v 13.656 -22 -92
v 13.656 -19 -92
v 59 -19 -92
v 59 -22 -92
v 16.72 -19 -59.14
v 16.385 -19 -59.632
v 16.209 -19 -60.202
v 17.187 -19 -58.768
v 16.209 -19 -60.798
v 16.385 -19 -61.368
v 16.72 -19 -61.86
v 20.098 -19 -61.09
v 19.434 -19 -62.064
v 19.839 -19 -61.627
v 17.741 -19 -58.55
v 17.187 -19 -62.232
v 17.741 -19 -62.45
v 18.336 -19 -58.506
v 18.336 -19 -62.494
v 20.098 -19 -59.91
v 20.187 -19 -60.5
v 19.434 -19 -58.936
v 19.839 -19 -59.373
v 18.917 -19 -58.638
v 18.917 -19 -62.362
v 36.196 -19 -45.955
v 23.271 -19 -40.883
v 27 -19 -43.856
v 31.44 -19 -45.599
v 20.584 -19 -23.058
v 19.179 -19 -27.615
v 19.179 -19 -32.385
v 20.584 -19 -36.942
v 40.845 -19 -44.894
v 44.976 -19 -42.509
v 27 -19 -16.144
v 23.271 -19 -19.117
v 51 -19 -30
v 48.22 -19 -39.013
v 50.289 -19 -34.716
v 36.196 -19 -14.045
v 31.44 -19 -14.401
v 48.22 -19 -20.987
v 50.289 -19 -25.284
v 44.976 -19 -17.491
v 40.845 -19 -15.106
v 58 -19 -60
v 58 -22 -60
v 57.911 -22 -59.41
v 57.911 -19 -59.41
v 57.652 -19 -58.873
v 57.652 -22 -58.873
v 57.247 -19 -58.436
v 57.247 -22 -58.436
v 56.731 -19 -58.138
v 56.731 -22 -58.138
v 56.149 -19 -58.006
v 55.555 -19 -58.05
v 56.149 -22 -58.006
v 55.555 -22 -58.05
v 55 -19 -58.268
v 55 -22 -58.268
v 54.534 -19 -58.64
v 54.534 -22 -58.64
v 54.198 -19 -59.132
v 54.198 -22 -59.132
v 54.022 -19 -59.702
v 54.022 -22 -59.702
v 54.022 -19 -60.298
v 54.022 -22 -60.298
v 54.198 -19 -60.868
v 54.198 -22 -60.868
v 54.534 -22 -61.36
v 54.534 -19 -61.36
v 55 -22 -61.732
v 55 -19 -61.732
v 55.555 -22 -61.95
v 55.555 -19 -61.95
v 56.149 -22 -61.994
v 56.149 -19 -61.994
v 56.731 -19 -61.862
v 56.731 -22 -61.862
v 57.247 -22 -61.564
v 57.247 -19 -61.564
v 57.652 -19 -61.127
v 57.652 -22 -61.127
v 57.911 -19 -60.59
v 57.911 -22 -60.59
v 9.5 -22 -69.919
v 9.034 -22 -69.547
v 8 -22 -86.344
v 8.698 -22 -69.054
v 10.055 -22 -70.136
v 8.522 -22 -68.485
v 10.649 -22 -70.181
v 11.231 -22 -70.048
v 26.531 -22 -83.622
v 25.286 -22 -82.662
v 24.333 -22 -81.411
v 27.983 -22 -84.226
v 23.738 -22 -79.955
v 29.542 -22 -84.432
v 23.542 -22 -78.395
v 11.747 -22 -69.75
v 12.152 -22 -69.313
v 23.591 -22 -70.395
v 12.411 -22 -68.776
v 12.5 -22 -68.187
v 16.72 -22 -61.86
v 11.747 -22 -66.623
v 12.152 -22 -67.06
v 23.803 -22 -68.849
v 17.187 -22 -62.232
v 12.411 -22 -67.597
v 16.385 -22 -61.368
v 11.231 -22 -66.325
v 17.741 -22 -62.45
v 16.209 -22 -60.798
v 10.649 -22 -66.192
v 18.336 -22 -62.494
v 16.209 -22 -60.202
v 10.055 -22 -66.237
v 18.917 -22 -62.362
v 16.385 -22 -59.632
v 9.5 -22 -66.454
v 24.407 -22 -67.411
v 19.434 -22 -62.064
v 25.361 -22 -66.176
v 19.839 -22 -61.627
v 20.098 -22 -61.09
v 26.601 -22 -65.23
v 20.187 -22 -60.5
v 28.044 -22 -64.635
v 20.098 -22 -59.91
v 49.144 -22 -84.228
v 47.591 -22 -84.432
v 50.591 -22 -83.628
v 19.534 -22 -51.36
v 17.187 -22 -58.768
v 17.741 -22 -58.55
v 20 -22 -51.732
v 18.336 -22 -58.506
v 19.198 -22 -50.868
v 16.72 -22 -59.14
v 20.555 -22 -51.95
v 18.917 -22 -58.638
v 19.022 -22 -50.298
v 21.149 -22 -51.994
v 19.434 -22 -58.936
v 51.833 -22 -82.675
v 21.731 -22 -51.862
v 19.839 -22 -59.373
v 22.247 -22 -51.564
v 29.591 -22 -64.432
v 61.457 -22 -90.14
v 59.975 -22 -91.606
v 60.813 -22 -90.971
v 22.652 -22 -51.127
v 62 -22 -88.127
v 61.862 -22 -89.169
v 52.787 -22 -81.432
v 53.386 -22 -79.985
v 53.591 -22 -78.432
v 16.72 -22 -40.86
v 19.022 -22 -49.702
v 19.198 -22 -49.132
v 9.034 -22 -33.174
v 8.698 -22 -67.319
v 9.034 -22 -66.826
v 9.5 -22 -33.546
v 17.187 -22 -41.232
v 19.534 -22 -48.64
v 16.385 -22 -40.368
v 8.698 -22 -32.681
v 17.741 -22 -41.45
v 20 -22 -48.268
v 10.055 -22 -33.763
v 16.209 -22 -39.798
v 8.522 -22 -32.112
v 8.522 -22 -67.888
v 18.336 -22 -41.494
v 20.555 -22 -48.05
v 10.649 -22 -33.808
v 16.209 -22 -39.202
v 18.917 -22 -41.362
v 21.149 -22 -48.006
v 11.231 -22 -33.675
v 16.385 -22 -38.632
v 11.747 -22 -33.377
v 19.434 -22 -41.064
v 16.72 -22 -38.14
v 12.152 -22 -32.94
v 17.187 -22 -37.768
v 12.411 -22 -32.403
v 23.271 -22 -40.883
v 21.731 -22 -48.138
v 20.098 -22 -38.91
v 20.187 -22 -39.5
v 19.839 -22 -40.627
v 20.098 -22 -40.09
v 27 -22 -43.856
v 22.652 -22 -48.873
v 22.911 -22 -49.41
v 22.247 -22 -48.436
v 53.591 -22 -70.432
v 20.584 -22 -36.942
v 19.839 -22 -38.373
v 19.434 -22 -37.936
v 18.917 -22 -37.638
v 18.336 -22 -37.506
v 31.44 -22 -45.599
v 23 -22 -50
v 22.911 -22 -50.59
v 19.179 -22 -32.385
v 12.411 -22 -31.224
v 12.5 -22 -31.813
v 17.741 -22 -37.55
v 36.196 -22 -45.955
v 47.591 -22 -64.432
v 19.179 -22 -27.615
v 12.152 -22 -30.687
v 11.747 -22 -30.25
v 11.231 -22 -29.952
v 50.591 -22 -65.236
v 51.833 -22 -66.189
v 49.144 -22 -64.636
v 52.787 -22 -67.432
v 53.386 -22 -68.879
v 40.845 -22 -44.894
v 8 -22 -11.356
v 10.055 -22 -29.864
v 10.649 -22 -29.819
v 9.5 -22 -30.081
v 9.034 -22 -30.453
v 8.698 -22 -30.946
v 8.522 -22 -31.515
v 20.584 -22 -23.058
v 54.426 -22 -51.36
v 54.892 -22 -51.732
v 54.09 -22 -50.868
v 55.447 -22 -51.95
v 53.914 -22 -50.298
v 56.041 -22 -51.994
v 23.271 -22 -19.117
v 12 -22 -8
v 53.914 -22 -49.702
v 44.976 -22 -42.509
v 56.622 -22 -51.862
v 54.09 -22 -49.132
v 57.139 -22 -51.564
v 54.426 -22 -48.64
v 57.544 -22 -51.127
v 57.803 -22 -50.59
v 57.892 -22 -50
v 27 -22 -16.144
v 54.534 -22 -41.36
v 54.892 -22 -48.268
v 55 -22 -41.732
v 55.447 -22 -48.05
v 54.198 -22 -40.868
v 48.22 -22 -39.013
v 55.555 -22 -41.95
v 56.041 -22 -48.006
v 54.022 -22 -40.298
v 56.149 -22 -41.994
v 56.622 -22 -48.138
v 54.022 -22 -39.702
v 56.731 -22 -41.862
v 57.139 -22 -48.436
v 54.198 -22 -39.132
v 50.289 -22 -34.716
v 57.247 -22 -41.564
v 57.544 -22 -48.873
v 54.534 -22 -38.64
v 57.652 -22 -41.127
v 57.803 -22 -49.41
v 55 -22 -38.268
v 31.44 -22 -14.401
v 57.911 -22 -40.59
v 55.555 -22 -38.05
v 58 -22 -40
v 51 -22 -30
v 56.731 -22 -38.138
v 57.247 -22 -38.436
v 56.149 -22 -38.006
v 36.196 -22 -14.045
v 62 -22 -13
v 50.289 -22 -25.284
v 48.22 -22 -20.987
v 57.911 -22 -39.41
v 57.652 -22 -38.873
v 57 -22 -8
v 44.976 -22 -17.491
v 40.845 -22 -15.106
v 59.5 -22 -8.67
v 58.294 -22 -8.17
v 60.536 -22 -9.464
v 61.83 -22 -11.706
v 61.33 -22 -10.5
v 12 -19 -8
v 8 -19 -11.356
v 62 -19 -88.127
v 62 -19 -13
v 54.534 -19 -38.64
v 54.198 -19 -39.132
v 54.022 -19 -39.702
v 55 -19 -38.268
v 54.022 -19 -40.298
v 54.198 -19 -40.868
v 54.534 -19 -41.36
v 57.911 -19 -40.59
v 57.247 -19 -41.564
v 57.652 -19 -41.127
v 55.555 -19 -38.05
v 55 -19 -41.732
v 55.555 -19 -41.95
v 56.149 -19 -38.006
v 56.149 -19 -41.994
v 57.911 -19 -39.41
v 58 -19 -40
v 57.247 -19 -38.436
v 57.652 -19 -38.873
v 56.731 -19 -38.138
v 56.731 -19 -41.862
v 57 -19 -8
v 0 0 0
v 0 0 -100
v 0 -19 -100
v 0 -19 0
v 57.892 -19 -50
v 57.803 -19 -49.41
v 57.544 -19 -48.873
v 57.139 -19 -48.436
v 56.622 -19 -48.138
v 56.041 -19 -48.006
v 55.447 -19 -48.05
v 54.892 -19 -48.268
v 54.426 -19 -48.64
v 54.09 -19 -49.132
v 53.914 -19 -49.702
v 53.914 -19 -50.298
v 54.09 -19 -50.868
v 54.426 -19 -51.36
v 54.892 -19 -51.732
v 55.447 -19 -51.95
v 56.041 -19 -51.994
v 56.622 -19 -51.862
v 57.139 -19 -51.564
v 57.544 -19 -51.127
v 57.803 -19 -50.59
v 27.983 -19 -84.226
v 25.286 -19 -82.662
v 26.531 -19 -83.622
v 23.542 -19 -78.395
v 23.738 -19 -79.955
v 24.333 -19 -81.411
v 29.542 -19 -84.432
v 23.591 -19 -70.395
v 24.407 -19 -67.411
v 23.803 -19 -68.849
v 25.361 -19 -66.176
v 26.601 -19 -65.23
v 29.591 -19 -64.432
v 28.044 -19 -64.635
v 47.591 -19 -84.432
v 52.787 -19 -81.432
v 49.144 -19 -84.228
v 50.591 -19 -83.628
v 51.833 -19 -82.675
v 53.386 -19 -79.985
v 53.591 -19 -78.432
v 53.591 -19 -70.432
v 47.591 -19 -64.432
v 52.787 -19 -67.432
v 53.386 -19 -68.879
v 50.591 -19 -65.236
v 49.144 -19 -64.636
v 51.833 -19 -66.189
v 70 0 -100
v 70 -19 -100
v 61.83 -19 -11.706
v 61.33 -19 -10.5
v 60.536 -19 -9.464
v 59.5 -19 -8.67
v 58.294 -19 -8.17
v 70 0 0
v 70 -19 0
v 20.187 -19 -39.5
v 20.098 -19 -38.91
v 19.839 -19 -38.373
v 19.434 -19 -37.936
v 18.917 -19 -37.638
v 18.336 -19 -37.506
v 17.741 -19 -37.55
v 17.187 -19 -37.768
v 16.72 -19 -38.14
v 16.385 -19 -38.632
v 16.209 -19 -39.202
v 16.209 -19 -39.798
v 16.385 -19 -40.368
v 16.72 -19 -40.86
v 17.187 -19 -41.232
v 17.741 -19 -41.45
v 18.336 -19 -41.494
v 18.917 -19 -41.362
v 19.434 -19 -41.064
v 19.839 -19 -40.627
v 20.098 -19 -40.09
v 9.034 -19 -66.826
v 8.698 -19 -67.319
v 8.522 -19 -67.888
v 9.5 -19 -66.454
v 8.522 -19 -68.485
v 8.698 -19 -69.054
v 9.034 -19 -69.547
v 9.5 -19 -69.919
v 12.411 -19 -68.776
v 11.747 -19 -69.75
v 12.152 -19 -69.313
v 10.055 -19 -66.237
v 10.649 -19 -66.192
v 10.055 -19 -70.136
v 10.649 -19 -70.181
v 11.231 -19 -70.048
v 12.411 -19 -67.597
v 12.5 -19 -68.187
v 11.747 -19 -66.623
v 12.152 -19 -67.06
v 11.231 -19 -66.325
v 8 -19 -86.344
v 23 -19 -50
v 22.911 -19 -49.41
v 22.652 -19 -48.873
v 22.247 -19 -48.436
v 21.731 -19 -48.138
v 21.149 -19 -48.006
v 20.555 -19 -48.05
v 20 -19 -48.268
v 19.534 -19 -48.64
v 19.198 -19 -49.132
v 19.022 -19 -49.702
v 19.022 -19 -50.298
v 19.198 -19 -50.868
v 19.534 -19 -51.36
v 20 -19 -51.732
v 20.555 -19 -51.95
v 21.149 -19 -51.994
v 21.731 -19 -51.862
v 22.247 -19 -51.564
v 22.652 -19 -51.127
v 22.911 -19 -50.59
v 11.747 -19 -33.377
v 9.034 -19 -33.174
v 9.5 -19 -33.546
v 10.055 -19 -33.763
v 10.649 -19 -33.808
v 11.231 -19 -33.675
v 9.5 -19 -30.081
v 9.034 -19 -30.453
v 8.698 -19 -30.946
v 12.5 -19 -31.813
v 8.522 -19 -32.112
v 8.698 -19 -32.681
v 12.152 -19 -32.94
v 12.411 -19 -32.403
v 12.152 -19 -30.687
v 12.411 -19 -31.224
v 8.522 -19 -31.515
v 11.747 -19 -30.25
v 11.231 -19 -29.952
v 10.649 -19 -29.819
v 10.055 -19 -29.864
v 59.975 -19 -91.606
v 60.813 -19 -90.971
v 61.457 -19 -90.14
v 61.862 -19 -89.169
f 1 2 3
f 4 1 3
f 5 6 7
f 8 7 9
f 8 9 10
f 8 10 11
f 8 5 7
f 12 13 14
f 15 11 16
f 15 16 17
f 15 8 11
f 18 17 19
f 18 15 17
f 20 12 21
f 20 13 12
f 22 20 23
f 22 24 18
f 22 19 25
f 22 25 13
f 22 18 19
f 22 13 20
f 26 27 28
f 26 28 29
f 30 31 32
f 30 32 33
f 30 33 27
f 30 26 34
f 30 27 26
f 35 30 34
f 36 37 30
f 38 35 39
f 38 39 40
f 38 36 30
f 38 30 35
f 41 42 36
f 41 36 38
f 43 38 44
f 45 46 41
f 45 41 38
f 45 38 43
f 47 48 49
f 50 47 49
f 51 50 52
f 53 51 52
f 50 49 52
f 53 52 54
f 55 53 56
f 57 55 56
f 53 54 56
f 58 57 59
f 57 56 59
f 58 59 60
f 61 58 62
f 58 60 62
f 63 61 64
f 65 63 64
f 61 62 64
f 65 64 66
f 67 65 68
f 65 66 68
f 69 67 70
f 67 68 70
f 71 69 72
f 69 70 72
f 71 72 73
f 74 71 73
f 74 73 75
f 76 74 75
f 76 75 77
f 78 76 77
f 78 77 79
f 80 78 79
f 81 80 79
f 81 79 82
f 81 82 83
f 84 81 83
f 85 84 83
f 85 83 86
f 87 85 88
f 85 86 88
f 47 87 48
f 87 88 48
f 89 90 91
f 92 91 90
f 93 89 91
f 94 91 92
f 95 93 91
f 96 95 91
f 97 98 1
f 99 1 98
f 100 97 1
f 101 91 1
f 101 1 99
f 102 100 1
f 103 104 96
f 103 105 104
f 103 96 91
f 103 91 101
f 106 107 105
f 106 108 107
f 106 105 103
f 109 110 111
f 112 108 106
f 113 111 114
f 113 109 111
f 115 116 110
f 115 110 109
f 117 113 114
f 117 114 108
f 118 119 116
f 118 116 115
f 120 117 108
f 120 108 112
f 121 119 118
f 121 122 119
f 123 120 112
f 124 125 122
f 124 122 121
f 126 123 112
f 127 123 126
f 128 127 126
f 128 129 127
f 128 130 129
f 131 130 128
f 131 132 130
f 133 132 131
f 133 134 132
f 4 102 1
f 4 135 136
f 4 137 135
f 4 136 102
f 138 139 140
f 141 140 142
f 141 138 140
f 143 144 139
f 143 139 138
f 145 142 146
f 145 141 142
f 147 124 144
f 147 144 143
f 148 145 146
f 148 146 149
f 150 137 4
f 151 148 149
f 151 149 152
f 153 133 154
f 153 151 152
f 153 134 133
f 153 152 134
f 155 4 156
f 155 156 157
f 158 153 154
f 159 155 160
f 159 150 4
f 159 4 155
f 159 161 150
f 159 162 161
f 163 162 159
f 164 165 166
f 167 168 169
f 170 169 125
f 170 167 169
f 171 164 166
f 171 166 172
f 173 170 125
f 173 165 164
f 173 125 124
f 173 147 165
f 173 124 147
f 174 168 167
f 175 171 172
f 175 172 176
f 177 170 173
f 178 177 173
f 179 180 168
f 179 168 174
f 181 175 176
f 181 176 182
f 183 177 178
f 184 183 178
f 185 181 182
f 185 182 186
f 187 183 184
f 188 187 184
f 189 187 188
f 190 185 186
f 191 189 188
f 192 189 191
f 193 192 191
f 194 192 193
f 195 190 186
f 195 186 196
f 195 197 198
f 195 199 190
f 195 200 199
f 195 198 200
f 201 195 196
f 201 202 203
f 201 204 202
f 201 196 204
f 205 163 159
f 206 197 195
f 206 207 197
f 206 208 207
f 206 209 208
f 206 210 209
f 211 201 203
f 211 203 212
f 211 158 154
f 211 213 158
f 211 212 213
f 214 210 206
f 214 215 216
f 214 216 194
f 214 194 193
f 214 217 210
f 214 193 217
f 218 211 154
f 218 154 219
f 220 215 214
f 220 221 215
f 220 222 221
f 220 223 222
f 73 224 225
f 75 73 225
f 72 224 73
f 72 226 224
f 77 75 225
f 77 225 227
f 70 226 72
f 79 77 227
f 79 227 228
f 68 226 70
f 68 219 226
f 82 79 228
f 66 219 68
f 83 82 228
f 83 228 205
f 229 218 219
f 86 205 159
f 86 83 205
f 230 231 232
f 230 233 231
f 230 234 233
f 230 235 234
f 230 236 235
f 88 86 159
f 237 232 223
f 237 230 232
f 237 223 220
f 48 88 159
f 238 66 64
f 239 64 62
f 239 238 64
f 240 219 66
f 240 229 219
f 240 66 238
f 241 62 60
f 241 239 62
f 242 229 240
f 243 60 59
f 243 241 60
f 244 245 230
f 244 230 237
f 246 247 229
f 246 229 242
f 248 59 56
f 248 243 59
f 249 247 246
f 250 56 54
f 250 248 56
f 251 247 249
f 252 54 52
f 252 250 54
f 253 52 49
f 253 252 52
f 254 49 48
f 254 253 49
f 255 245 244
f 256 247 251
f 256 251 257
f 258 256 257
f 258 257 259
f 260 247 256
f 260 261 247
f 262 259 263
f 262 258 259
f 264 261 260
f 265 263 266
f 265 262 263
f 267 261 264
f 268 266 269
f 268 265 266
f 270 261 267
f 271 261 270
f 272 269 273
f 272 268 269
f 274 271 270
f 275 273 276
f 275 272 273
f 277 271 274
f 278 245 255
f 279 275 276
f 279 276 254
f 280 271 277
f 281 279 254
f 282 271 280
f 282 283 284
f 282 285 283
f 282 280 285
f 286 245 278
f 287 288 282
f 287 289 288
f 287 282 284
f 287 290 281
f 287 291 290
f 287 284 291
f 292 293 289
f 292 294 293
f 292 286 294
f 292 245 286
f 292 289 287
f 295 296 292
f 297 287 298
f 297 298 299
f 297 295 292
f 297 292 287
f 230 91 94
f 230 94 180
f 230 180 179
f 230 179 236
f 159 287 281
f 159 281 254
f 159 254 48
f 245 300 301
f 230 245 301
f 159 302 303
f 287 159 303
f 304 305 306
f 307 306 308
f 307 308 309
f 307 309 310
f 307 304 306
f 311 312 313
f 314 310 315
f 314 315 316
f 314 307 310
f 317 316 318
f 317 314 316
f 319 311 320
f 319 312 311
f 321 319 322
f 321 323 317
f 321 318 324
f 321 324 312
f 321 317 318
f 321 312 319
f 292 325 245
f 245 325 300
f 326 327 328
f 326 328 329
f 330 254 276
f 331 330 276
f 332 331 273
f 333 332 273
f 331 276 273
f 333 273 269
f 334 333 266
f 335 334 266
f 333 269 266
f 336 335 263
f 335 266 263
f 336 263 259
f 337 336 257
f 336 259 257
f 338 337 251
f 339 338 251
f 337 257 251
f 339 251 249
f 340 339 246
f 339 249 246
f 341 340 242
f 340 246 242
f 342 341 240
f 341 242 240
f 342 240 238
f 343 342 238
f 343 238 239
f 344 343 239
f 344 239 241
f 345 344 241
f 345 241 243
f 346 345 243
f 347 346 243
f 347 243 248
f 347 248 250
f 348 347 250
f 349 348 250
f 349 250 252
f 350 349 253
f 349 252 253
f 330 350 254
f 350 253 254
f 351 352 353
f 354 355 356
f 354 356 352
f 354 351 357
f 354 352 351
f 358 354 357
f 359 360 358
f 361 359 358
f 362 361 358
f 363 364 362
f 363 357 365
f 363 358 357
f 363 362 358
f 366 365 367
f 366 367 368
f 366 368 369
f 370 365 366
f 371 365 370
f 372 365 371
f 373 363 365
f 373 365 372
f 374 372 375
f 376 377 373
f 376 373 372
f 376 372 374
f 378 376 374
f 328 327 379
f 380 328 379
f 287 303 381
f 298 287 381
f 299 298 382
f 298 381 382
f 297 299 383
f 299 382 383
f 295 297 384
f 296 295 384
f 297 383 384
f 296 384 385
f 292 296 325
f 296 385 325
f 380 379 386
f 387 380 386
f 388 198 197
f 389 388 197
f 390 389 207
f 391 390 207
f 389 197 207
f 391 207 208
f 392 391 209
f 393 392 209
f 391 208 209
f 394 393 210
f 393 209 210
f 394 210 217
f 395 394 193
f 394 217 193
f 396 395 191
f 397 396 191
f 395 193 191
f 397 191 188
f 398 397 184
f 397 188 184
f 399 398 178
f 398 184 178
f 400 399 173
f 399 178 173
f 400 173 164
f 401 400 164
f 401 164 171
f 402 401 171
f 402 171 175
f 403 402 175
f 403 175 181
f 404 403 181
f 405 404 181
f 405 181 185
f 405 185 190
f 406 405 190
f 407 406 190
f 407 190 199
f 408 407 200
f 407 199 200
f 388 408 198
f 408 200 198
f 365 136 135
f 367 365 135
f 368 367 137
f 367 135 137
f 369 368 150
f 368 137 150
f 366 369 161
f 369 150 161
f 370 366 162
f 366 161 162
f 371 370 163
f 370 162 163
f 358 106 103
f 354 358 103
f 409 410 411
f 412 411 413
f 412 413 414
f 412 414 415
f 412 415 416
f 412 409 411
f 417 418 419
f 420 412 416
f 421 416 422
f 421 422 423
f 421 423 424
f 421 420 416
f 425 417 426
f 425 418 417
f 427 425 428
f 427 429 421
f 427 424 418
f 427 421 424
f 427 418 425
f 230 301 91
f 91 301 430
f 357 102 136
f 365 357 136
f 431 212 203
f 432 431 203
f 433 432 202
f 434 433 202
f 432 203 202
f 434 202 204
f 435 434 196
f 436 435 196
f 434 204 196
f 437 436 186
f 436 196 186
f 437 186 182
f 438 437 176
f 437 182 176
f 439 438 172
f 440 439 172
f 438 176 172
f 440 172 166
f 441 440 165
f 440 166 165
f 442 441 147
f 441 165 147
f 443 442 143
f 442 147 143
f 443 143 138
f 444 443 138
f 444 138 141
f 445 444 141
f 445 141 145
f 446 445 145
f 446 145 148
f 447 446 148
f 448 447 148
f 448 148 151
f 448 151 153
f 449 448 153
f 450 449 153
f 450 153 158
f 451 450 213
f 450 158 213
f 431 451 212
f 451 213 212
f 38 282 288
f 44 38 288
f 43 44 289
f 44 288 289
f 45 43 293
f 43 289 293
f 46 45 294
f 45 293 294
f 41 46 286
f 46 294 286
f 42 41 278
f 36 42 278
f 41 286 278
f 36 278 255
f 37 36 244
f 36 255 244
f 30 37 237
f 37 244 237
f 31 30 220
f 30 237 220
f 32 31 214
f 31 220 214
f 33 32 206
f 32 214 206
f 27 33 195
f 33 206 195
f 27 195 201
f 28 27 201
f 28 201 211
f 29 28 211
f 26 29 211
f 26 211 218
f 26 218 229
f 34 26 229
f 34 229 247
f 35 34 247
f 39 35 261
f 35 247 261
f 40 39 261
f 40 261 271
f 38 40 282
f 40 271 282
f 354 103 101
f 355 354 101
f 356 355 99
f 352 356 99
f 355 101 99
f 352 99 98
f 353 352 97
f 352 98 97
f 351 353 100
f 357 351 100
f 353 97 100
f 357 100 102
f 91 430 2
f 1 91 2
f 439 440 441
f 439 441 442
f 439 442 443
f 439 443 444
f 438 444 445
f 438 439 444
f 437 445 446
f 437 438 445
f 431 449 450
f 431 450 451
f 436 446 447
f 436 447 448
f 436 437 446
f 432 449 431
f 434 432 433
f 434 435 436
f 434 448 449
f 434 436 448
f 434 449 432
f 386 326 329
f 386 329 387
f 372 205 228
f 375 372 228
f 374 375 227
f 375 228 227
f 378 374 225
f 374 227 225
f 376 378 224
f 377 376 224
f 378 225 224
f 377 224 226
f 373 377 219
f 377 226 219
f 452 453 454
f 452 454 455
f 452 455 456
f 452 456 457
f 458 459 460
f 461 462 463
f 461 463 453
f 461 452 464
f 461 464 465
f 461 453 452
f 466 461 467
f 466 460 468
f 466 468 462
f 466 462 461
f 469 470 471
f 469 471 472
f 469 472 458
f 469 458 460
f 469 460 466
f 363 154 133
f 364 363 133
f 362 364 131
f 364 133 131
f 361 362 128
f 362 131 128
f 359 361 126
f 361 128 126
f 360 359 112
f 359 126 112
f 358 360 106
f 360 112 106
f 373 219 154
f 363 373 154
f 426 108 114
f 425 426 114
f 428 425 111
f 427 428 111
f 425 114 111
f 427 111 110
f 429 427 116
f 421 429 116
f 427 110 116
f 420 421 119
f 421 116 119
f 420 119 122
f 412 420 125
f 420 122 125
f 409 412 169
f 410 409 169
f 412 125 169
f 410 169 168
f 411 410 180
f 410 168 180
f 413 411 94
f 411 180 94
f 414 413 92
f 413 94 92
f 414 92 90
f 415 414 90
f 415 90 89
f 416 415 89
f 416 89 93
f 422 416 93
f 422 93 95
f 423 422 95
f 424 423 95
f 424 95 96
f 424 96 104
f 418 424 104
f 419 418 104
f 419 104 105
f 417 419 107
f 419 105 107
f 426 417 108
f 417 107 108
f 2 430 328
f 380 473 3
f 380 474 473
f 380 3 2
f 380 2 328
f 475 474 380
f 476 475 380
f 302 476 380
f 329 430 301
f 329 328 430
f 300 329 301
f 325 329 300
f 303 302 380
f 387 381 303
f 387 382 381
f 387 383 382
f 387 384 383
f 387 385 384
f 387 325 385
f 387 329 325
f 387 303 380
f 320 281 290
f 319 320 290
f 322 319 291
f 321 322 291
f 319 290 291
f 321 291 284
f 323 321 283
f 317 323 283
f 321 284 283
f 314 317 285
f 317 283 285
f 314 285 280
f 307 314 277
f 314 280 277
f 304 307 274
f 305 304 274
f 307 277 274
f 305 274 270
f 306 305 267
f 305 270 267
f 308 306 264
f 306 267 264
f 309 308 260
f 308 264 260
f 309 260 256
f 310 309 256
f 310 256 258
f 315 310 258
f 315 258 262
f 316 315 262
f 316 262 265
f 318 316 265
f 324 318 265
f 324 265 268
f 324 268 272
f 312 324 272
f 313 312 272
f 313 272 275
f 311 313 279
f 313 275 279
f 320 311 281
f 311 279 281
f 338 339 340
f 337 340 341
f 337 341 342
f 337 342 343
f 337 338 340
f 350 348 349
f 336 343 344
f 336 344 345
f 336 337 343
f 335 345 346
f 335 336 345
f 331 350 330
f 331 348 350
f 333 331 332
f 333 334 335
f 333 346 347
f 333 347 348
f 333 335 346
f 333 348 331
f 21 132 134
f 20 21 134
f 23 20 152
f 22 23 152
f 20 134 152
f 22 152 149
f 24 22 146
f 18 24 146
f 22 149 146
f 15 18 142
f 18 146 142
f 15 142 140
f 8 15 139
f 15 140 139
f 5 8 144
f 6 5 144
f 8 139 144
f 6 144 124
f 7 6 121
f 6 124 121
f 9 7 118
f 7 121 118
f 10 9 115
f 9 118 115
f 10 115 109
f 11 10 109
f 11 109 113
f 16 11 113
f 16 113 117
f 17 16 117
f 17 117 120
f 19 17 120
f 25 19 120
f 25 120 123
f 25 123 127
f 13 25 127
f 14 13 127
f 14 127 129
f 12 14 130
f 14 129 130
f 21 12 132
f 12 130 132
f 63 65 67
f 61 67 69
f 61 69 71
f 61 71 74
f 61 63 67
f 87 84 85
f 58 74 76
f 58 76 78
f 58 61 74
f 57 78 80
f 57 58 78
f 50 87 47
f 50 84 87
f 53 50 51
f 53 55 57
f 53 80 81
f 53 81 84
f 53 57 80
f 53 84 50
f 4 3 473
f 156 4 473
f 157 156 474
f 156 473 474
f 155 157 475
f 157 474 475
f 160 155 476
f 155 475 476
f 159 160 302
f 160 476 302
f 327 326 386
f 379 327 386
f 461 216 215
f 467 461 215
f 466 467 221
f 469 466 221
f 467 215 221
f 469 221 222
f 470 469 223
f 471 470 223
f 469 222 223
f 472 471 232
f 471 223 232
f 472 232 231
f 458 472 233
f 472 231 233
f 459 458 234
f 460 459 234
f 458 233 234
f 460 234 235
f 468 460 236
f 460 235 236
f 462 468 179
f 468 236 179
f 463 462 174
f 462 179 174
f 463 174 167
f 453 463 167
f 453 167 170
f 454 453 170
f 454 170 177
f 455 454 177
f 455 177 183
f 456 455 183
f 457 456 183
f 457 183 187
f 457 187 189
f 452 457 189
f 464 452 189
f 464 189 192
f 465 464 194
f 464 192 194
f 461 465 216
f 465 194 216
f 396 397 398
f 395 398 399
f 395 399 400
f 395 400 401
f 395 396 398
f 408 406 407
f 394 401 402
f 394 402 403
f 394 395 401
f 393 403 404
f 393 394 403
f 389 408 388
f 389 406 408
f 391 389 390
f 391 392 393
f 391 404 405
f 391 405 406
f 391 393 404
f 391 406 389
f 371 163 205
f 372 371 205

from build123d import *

# Parameters (mm, degrees)
F0_W      = 70
F0_H      = 100
F1_DEPTH  = 19
F3_DEPTH  = 3
F4_R      = 16
F5_DEPTH  = 3
F7_DEPTH  = 3
F8_R      = 2
F9_DEPTH  = 3
F10_R     = 2
F11_DEPTH = 3


with BuildPart() as f1:
    # F0 (on Front) → F1 (new body)
    with BuildSketch(Plane.XZ):
        with Locations((35, -50)):
            Rectangle(F0_W, F0_H)
    extrude(amount=F1_DEPTH)

    # F2 (on face) → F3 (join)
    with BuildSketch(Plane.XZ.offset(19)):
        with BuildLine():
            Line((57, -8), (12, -8))
            Line((12, -8), (8, -11.356399))
            Line((8, -11.356399), (8, -86.344417))
            Line((8, -86.344417), (13.655583, -92))
            Line((13.655583, -92), (59, -92))
            ThreePointArc((59, -92), (61.162278, -90.576506), (62, -88.127017))
            Line((62, -88.127017), (62, -13))
            ThreePointArc((62, -13), (60.535534, -9.464466), (57, -8))
        make_face()
    extrude(amount=F3_DEPTH)

    # F4 (on face) → F5 (cut)
    with BuildSketch(Plane.XZ.offset(22)):
        with Locations((35, -30)):
            Circle(F4_R)
    extrude(amount=-F5_DEPTH, mode=Mode.SUBTRACT)

    # F6 (on face) → F7 (cut)
    with BuildSketch(Plane.XZ.offset(22)):
        with BuildLine():
            Line((47.590841, -64.431946), (29.590728, -64.431946))
            ThreePointArc((29.590728, -64.431946), (25.361132, -66.176302), (23.590841, -70.395109))
            Line((23.590841, -70.395109), (23.541725, -78.395109))
            ThreePointArc((23.541725, -78.395109), (25.285967, -82.661543), (29.541612, -84.431946))
            Line((29.541612, -84.431946), (47.590841, -84.431946))
            ThreePointArc((47.590841, -84.431946), (51.833482, -82.674587), (53.590841, -78.431946))
            Line((53.590841, -78.431946), (53.590841, -70.431946))
            ThreePointArc((53.590841, -70.431946), (51.833482, -66.189306), (47.590841, -64.431946))
        make_face()
    extrude(amount=-F7_DEPTH, mode=Mode.SUBTRACT)

    # F8 (on face) → F9 (cut)
    with BuildSketch(Plane.XZ.offset(22)):
        with Locations((10.5, -31.813467)):
            Circle(F8_R)
        with Locations((18.186533, -39.5)):
            Circle(F8_R)
        with BuildLine():
            ThreePointArc((19, -50), (21, -52), (23, -50))
            ThreePointArc((23, -50), (21, -48), (19, -50))
        make_face()
        with Locations((18.186533, -60.5)):
            Circle(F8_R)
        with Locations((10.5, -68.186533)):
            Circle(F8_R)
    extrude(amount=-F9_DEPTH, mode=Mode.SUBTRACT)

    # F10 (on face) → F11 (cut)
    with BuildSketch(Plane.XZ.offset(22)):
        with Locations((56, -40)):
            Circle(F10_R)
        with Locations((55.891707, -50)):
            Circle(F10_R)
        with Locations((56, -60)):
            Circle(F10_R)
    extrude(amount=-F11_DEPTH, mode=Mode.SUBTRACT)


solid = f1.part
